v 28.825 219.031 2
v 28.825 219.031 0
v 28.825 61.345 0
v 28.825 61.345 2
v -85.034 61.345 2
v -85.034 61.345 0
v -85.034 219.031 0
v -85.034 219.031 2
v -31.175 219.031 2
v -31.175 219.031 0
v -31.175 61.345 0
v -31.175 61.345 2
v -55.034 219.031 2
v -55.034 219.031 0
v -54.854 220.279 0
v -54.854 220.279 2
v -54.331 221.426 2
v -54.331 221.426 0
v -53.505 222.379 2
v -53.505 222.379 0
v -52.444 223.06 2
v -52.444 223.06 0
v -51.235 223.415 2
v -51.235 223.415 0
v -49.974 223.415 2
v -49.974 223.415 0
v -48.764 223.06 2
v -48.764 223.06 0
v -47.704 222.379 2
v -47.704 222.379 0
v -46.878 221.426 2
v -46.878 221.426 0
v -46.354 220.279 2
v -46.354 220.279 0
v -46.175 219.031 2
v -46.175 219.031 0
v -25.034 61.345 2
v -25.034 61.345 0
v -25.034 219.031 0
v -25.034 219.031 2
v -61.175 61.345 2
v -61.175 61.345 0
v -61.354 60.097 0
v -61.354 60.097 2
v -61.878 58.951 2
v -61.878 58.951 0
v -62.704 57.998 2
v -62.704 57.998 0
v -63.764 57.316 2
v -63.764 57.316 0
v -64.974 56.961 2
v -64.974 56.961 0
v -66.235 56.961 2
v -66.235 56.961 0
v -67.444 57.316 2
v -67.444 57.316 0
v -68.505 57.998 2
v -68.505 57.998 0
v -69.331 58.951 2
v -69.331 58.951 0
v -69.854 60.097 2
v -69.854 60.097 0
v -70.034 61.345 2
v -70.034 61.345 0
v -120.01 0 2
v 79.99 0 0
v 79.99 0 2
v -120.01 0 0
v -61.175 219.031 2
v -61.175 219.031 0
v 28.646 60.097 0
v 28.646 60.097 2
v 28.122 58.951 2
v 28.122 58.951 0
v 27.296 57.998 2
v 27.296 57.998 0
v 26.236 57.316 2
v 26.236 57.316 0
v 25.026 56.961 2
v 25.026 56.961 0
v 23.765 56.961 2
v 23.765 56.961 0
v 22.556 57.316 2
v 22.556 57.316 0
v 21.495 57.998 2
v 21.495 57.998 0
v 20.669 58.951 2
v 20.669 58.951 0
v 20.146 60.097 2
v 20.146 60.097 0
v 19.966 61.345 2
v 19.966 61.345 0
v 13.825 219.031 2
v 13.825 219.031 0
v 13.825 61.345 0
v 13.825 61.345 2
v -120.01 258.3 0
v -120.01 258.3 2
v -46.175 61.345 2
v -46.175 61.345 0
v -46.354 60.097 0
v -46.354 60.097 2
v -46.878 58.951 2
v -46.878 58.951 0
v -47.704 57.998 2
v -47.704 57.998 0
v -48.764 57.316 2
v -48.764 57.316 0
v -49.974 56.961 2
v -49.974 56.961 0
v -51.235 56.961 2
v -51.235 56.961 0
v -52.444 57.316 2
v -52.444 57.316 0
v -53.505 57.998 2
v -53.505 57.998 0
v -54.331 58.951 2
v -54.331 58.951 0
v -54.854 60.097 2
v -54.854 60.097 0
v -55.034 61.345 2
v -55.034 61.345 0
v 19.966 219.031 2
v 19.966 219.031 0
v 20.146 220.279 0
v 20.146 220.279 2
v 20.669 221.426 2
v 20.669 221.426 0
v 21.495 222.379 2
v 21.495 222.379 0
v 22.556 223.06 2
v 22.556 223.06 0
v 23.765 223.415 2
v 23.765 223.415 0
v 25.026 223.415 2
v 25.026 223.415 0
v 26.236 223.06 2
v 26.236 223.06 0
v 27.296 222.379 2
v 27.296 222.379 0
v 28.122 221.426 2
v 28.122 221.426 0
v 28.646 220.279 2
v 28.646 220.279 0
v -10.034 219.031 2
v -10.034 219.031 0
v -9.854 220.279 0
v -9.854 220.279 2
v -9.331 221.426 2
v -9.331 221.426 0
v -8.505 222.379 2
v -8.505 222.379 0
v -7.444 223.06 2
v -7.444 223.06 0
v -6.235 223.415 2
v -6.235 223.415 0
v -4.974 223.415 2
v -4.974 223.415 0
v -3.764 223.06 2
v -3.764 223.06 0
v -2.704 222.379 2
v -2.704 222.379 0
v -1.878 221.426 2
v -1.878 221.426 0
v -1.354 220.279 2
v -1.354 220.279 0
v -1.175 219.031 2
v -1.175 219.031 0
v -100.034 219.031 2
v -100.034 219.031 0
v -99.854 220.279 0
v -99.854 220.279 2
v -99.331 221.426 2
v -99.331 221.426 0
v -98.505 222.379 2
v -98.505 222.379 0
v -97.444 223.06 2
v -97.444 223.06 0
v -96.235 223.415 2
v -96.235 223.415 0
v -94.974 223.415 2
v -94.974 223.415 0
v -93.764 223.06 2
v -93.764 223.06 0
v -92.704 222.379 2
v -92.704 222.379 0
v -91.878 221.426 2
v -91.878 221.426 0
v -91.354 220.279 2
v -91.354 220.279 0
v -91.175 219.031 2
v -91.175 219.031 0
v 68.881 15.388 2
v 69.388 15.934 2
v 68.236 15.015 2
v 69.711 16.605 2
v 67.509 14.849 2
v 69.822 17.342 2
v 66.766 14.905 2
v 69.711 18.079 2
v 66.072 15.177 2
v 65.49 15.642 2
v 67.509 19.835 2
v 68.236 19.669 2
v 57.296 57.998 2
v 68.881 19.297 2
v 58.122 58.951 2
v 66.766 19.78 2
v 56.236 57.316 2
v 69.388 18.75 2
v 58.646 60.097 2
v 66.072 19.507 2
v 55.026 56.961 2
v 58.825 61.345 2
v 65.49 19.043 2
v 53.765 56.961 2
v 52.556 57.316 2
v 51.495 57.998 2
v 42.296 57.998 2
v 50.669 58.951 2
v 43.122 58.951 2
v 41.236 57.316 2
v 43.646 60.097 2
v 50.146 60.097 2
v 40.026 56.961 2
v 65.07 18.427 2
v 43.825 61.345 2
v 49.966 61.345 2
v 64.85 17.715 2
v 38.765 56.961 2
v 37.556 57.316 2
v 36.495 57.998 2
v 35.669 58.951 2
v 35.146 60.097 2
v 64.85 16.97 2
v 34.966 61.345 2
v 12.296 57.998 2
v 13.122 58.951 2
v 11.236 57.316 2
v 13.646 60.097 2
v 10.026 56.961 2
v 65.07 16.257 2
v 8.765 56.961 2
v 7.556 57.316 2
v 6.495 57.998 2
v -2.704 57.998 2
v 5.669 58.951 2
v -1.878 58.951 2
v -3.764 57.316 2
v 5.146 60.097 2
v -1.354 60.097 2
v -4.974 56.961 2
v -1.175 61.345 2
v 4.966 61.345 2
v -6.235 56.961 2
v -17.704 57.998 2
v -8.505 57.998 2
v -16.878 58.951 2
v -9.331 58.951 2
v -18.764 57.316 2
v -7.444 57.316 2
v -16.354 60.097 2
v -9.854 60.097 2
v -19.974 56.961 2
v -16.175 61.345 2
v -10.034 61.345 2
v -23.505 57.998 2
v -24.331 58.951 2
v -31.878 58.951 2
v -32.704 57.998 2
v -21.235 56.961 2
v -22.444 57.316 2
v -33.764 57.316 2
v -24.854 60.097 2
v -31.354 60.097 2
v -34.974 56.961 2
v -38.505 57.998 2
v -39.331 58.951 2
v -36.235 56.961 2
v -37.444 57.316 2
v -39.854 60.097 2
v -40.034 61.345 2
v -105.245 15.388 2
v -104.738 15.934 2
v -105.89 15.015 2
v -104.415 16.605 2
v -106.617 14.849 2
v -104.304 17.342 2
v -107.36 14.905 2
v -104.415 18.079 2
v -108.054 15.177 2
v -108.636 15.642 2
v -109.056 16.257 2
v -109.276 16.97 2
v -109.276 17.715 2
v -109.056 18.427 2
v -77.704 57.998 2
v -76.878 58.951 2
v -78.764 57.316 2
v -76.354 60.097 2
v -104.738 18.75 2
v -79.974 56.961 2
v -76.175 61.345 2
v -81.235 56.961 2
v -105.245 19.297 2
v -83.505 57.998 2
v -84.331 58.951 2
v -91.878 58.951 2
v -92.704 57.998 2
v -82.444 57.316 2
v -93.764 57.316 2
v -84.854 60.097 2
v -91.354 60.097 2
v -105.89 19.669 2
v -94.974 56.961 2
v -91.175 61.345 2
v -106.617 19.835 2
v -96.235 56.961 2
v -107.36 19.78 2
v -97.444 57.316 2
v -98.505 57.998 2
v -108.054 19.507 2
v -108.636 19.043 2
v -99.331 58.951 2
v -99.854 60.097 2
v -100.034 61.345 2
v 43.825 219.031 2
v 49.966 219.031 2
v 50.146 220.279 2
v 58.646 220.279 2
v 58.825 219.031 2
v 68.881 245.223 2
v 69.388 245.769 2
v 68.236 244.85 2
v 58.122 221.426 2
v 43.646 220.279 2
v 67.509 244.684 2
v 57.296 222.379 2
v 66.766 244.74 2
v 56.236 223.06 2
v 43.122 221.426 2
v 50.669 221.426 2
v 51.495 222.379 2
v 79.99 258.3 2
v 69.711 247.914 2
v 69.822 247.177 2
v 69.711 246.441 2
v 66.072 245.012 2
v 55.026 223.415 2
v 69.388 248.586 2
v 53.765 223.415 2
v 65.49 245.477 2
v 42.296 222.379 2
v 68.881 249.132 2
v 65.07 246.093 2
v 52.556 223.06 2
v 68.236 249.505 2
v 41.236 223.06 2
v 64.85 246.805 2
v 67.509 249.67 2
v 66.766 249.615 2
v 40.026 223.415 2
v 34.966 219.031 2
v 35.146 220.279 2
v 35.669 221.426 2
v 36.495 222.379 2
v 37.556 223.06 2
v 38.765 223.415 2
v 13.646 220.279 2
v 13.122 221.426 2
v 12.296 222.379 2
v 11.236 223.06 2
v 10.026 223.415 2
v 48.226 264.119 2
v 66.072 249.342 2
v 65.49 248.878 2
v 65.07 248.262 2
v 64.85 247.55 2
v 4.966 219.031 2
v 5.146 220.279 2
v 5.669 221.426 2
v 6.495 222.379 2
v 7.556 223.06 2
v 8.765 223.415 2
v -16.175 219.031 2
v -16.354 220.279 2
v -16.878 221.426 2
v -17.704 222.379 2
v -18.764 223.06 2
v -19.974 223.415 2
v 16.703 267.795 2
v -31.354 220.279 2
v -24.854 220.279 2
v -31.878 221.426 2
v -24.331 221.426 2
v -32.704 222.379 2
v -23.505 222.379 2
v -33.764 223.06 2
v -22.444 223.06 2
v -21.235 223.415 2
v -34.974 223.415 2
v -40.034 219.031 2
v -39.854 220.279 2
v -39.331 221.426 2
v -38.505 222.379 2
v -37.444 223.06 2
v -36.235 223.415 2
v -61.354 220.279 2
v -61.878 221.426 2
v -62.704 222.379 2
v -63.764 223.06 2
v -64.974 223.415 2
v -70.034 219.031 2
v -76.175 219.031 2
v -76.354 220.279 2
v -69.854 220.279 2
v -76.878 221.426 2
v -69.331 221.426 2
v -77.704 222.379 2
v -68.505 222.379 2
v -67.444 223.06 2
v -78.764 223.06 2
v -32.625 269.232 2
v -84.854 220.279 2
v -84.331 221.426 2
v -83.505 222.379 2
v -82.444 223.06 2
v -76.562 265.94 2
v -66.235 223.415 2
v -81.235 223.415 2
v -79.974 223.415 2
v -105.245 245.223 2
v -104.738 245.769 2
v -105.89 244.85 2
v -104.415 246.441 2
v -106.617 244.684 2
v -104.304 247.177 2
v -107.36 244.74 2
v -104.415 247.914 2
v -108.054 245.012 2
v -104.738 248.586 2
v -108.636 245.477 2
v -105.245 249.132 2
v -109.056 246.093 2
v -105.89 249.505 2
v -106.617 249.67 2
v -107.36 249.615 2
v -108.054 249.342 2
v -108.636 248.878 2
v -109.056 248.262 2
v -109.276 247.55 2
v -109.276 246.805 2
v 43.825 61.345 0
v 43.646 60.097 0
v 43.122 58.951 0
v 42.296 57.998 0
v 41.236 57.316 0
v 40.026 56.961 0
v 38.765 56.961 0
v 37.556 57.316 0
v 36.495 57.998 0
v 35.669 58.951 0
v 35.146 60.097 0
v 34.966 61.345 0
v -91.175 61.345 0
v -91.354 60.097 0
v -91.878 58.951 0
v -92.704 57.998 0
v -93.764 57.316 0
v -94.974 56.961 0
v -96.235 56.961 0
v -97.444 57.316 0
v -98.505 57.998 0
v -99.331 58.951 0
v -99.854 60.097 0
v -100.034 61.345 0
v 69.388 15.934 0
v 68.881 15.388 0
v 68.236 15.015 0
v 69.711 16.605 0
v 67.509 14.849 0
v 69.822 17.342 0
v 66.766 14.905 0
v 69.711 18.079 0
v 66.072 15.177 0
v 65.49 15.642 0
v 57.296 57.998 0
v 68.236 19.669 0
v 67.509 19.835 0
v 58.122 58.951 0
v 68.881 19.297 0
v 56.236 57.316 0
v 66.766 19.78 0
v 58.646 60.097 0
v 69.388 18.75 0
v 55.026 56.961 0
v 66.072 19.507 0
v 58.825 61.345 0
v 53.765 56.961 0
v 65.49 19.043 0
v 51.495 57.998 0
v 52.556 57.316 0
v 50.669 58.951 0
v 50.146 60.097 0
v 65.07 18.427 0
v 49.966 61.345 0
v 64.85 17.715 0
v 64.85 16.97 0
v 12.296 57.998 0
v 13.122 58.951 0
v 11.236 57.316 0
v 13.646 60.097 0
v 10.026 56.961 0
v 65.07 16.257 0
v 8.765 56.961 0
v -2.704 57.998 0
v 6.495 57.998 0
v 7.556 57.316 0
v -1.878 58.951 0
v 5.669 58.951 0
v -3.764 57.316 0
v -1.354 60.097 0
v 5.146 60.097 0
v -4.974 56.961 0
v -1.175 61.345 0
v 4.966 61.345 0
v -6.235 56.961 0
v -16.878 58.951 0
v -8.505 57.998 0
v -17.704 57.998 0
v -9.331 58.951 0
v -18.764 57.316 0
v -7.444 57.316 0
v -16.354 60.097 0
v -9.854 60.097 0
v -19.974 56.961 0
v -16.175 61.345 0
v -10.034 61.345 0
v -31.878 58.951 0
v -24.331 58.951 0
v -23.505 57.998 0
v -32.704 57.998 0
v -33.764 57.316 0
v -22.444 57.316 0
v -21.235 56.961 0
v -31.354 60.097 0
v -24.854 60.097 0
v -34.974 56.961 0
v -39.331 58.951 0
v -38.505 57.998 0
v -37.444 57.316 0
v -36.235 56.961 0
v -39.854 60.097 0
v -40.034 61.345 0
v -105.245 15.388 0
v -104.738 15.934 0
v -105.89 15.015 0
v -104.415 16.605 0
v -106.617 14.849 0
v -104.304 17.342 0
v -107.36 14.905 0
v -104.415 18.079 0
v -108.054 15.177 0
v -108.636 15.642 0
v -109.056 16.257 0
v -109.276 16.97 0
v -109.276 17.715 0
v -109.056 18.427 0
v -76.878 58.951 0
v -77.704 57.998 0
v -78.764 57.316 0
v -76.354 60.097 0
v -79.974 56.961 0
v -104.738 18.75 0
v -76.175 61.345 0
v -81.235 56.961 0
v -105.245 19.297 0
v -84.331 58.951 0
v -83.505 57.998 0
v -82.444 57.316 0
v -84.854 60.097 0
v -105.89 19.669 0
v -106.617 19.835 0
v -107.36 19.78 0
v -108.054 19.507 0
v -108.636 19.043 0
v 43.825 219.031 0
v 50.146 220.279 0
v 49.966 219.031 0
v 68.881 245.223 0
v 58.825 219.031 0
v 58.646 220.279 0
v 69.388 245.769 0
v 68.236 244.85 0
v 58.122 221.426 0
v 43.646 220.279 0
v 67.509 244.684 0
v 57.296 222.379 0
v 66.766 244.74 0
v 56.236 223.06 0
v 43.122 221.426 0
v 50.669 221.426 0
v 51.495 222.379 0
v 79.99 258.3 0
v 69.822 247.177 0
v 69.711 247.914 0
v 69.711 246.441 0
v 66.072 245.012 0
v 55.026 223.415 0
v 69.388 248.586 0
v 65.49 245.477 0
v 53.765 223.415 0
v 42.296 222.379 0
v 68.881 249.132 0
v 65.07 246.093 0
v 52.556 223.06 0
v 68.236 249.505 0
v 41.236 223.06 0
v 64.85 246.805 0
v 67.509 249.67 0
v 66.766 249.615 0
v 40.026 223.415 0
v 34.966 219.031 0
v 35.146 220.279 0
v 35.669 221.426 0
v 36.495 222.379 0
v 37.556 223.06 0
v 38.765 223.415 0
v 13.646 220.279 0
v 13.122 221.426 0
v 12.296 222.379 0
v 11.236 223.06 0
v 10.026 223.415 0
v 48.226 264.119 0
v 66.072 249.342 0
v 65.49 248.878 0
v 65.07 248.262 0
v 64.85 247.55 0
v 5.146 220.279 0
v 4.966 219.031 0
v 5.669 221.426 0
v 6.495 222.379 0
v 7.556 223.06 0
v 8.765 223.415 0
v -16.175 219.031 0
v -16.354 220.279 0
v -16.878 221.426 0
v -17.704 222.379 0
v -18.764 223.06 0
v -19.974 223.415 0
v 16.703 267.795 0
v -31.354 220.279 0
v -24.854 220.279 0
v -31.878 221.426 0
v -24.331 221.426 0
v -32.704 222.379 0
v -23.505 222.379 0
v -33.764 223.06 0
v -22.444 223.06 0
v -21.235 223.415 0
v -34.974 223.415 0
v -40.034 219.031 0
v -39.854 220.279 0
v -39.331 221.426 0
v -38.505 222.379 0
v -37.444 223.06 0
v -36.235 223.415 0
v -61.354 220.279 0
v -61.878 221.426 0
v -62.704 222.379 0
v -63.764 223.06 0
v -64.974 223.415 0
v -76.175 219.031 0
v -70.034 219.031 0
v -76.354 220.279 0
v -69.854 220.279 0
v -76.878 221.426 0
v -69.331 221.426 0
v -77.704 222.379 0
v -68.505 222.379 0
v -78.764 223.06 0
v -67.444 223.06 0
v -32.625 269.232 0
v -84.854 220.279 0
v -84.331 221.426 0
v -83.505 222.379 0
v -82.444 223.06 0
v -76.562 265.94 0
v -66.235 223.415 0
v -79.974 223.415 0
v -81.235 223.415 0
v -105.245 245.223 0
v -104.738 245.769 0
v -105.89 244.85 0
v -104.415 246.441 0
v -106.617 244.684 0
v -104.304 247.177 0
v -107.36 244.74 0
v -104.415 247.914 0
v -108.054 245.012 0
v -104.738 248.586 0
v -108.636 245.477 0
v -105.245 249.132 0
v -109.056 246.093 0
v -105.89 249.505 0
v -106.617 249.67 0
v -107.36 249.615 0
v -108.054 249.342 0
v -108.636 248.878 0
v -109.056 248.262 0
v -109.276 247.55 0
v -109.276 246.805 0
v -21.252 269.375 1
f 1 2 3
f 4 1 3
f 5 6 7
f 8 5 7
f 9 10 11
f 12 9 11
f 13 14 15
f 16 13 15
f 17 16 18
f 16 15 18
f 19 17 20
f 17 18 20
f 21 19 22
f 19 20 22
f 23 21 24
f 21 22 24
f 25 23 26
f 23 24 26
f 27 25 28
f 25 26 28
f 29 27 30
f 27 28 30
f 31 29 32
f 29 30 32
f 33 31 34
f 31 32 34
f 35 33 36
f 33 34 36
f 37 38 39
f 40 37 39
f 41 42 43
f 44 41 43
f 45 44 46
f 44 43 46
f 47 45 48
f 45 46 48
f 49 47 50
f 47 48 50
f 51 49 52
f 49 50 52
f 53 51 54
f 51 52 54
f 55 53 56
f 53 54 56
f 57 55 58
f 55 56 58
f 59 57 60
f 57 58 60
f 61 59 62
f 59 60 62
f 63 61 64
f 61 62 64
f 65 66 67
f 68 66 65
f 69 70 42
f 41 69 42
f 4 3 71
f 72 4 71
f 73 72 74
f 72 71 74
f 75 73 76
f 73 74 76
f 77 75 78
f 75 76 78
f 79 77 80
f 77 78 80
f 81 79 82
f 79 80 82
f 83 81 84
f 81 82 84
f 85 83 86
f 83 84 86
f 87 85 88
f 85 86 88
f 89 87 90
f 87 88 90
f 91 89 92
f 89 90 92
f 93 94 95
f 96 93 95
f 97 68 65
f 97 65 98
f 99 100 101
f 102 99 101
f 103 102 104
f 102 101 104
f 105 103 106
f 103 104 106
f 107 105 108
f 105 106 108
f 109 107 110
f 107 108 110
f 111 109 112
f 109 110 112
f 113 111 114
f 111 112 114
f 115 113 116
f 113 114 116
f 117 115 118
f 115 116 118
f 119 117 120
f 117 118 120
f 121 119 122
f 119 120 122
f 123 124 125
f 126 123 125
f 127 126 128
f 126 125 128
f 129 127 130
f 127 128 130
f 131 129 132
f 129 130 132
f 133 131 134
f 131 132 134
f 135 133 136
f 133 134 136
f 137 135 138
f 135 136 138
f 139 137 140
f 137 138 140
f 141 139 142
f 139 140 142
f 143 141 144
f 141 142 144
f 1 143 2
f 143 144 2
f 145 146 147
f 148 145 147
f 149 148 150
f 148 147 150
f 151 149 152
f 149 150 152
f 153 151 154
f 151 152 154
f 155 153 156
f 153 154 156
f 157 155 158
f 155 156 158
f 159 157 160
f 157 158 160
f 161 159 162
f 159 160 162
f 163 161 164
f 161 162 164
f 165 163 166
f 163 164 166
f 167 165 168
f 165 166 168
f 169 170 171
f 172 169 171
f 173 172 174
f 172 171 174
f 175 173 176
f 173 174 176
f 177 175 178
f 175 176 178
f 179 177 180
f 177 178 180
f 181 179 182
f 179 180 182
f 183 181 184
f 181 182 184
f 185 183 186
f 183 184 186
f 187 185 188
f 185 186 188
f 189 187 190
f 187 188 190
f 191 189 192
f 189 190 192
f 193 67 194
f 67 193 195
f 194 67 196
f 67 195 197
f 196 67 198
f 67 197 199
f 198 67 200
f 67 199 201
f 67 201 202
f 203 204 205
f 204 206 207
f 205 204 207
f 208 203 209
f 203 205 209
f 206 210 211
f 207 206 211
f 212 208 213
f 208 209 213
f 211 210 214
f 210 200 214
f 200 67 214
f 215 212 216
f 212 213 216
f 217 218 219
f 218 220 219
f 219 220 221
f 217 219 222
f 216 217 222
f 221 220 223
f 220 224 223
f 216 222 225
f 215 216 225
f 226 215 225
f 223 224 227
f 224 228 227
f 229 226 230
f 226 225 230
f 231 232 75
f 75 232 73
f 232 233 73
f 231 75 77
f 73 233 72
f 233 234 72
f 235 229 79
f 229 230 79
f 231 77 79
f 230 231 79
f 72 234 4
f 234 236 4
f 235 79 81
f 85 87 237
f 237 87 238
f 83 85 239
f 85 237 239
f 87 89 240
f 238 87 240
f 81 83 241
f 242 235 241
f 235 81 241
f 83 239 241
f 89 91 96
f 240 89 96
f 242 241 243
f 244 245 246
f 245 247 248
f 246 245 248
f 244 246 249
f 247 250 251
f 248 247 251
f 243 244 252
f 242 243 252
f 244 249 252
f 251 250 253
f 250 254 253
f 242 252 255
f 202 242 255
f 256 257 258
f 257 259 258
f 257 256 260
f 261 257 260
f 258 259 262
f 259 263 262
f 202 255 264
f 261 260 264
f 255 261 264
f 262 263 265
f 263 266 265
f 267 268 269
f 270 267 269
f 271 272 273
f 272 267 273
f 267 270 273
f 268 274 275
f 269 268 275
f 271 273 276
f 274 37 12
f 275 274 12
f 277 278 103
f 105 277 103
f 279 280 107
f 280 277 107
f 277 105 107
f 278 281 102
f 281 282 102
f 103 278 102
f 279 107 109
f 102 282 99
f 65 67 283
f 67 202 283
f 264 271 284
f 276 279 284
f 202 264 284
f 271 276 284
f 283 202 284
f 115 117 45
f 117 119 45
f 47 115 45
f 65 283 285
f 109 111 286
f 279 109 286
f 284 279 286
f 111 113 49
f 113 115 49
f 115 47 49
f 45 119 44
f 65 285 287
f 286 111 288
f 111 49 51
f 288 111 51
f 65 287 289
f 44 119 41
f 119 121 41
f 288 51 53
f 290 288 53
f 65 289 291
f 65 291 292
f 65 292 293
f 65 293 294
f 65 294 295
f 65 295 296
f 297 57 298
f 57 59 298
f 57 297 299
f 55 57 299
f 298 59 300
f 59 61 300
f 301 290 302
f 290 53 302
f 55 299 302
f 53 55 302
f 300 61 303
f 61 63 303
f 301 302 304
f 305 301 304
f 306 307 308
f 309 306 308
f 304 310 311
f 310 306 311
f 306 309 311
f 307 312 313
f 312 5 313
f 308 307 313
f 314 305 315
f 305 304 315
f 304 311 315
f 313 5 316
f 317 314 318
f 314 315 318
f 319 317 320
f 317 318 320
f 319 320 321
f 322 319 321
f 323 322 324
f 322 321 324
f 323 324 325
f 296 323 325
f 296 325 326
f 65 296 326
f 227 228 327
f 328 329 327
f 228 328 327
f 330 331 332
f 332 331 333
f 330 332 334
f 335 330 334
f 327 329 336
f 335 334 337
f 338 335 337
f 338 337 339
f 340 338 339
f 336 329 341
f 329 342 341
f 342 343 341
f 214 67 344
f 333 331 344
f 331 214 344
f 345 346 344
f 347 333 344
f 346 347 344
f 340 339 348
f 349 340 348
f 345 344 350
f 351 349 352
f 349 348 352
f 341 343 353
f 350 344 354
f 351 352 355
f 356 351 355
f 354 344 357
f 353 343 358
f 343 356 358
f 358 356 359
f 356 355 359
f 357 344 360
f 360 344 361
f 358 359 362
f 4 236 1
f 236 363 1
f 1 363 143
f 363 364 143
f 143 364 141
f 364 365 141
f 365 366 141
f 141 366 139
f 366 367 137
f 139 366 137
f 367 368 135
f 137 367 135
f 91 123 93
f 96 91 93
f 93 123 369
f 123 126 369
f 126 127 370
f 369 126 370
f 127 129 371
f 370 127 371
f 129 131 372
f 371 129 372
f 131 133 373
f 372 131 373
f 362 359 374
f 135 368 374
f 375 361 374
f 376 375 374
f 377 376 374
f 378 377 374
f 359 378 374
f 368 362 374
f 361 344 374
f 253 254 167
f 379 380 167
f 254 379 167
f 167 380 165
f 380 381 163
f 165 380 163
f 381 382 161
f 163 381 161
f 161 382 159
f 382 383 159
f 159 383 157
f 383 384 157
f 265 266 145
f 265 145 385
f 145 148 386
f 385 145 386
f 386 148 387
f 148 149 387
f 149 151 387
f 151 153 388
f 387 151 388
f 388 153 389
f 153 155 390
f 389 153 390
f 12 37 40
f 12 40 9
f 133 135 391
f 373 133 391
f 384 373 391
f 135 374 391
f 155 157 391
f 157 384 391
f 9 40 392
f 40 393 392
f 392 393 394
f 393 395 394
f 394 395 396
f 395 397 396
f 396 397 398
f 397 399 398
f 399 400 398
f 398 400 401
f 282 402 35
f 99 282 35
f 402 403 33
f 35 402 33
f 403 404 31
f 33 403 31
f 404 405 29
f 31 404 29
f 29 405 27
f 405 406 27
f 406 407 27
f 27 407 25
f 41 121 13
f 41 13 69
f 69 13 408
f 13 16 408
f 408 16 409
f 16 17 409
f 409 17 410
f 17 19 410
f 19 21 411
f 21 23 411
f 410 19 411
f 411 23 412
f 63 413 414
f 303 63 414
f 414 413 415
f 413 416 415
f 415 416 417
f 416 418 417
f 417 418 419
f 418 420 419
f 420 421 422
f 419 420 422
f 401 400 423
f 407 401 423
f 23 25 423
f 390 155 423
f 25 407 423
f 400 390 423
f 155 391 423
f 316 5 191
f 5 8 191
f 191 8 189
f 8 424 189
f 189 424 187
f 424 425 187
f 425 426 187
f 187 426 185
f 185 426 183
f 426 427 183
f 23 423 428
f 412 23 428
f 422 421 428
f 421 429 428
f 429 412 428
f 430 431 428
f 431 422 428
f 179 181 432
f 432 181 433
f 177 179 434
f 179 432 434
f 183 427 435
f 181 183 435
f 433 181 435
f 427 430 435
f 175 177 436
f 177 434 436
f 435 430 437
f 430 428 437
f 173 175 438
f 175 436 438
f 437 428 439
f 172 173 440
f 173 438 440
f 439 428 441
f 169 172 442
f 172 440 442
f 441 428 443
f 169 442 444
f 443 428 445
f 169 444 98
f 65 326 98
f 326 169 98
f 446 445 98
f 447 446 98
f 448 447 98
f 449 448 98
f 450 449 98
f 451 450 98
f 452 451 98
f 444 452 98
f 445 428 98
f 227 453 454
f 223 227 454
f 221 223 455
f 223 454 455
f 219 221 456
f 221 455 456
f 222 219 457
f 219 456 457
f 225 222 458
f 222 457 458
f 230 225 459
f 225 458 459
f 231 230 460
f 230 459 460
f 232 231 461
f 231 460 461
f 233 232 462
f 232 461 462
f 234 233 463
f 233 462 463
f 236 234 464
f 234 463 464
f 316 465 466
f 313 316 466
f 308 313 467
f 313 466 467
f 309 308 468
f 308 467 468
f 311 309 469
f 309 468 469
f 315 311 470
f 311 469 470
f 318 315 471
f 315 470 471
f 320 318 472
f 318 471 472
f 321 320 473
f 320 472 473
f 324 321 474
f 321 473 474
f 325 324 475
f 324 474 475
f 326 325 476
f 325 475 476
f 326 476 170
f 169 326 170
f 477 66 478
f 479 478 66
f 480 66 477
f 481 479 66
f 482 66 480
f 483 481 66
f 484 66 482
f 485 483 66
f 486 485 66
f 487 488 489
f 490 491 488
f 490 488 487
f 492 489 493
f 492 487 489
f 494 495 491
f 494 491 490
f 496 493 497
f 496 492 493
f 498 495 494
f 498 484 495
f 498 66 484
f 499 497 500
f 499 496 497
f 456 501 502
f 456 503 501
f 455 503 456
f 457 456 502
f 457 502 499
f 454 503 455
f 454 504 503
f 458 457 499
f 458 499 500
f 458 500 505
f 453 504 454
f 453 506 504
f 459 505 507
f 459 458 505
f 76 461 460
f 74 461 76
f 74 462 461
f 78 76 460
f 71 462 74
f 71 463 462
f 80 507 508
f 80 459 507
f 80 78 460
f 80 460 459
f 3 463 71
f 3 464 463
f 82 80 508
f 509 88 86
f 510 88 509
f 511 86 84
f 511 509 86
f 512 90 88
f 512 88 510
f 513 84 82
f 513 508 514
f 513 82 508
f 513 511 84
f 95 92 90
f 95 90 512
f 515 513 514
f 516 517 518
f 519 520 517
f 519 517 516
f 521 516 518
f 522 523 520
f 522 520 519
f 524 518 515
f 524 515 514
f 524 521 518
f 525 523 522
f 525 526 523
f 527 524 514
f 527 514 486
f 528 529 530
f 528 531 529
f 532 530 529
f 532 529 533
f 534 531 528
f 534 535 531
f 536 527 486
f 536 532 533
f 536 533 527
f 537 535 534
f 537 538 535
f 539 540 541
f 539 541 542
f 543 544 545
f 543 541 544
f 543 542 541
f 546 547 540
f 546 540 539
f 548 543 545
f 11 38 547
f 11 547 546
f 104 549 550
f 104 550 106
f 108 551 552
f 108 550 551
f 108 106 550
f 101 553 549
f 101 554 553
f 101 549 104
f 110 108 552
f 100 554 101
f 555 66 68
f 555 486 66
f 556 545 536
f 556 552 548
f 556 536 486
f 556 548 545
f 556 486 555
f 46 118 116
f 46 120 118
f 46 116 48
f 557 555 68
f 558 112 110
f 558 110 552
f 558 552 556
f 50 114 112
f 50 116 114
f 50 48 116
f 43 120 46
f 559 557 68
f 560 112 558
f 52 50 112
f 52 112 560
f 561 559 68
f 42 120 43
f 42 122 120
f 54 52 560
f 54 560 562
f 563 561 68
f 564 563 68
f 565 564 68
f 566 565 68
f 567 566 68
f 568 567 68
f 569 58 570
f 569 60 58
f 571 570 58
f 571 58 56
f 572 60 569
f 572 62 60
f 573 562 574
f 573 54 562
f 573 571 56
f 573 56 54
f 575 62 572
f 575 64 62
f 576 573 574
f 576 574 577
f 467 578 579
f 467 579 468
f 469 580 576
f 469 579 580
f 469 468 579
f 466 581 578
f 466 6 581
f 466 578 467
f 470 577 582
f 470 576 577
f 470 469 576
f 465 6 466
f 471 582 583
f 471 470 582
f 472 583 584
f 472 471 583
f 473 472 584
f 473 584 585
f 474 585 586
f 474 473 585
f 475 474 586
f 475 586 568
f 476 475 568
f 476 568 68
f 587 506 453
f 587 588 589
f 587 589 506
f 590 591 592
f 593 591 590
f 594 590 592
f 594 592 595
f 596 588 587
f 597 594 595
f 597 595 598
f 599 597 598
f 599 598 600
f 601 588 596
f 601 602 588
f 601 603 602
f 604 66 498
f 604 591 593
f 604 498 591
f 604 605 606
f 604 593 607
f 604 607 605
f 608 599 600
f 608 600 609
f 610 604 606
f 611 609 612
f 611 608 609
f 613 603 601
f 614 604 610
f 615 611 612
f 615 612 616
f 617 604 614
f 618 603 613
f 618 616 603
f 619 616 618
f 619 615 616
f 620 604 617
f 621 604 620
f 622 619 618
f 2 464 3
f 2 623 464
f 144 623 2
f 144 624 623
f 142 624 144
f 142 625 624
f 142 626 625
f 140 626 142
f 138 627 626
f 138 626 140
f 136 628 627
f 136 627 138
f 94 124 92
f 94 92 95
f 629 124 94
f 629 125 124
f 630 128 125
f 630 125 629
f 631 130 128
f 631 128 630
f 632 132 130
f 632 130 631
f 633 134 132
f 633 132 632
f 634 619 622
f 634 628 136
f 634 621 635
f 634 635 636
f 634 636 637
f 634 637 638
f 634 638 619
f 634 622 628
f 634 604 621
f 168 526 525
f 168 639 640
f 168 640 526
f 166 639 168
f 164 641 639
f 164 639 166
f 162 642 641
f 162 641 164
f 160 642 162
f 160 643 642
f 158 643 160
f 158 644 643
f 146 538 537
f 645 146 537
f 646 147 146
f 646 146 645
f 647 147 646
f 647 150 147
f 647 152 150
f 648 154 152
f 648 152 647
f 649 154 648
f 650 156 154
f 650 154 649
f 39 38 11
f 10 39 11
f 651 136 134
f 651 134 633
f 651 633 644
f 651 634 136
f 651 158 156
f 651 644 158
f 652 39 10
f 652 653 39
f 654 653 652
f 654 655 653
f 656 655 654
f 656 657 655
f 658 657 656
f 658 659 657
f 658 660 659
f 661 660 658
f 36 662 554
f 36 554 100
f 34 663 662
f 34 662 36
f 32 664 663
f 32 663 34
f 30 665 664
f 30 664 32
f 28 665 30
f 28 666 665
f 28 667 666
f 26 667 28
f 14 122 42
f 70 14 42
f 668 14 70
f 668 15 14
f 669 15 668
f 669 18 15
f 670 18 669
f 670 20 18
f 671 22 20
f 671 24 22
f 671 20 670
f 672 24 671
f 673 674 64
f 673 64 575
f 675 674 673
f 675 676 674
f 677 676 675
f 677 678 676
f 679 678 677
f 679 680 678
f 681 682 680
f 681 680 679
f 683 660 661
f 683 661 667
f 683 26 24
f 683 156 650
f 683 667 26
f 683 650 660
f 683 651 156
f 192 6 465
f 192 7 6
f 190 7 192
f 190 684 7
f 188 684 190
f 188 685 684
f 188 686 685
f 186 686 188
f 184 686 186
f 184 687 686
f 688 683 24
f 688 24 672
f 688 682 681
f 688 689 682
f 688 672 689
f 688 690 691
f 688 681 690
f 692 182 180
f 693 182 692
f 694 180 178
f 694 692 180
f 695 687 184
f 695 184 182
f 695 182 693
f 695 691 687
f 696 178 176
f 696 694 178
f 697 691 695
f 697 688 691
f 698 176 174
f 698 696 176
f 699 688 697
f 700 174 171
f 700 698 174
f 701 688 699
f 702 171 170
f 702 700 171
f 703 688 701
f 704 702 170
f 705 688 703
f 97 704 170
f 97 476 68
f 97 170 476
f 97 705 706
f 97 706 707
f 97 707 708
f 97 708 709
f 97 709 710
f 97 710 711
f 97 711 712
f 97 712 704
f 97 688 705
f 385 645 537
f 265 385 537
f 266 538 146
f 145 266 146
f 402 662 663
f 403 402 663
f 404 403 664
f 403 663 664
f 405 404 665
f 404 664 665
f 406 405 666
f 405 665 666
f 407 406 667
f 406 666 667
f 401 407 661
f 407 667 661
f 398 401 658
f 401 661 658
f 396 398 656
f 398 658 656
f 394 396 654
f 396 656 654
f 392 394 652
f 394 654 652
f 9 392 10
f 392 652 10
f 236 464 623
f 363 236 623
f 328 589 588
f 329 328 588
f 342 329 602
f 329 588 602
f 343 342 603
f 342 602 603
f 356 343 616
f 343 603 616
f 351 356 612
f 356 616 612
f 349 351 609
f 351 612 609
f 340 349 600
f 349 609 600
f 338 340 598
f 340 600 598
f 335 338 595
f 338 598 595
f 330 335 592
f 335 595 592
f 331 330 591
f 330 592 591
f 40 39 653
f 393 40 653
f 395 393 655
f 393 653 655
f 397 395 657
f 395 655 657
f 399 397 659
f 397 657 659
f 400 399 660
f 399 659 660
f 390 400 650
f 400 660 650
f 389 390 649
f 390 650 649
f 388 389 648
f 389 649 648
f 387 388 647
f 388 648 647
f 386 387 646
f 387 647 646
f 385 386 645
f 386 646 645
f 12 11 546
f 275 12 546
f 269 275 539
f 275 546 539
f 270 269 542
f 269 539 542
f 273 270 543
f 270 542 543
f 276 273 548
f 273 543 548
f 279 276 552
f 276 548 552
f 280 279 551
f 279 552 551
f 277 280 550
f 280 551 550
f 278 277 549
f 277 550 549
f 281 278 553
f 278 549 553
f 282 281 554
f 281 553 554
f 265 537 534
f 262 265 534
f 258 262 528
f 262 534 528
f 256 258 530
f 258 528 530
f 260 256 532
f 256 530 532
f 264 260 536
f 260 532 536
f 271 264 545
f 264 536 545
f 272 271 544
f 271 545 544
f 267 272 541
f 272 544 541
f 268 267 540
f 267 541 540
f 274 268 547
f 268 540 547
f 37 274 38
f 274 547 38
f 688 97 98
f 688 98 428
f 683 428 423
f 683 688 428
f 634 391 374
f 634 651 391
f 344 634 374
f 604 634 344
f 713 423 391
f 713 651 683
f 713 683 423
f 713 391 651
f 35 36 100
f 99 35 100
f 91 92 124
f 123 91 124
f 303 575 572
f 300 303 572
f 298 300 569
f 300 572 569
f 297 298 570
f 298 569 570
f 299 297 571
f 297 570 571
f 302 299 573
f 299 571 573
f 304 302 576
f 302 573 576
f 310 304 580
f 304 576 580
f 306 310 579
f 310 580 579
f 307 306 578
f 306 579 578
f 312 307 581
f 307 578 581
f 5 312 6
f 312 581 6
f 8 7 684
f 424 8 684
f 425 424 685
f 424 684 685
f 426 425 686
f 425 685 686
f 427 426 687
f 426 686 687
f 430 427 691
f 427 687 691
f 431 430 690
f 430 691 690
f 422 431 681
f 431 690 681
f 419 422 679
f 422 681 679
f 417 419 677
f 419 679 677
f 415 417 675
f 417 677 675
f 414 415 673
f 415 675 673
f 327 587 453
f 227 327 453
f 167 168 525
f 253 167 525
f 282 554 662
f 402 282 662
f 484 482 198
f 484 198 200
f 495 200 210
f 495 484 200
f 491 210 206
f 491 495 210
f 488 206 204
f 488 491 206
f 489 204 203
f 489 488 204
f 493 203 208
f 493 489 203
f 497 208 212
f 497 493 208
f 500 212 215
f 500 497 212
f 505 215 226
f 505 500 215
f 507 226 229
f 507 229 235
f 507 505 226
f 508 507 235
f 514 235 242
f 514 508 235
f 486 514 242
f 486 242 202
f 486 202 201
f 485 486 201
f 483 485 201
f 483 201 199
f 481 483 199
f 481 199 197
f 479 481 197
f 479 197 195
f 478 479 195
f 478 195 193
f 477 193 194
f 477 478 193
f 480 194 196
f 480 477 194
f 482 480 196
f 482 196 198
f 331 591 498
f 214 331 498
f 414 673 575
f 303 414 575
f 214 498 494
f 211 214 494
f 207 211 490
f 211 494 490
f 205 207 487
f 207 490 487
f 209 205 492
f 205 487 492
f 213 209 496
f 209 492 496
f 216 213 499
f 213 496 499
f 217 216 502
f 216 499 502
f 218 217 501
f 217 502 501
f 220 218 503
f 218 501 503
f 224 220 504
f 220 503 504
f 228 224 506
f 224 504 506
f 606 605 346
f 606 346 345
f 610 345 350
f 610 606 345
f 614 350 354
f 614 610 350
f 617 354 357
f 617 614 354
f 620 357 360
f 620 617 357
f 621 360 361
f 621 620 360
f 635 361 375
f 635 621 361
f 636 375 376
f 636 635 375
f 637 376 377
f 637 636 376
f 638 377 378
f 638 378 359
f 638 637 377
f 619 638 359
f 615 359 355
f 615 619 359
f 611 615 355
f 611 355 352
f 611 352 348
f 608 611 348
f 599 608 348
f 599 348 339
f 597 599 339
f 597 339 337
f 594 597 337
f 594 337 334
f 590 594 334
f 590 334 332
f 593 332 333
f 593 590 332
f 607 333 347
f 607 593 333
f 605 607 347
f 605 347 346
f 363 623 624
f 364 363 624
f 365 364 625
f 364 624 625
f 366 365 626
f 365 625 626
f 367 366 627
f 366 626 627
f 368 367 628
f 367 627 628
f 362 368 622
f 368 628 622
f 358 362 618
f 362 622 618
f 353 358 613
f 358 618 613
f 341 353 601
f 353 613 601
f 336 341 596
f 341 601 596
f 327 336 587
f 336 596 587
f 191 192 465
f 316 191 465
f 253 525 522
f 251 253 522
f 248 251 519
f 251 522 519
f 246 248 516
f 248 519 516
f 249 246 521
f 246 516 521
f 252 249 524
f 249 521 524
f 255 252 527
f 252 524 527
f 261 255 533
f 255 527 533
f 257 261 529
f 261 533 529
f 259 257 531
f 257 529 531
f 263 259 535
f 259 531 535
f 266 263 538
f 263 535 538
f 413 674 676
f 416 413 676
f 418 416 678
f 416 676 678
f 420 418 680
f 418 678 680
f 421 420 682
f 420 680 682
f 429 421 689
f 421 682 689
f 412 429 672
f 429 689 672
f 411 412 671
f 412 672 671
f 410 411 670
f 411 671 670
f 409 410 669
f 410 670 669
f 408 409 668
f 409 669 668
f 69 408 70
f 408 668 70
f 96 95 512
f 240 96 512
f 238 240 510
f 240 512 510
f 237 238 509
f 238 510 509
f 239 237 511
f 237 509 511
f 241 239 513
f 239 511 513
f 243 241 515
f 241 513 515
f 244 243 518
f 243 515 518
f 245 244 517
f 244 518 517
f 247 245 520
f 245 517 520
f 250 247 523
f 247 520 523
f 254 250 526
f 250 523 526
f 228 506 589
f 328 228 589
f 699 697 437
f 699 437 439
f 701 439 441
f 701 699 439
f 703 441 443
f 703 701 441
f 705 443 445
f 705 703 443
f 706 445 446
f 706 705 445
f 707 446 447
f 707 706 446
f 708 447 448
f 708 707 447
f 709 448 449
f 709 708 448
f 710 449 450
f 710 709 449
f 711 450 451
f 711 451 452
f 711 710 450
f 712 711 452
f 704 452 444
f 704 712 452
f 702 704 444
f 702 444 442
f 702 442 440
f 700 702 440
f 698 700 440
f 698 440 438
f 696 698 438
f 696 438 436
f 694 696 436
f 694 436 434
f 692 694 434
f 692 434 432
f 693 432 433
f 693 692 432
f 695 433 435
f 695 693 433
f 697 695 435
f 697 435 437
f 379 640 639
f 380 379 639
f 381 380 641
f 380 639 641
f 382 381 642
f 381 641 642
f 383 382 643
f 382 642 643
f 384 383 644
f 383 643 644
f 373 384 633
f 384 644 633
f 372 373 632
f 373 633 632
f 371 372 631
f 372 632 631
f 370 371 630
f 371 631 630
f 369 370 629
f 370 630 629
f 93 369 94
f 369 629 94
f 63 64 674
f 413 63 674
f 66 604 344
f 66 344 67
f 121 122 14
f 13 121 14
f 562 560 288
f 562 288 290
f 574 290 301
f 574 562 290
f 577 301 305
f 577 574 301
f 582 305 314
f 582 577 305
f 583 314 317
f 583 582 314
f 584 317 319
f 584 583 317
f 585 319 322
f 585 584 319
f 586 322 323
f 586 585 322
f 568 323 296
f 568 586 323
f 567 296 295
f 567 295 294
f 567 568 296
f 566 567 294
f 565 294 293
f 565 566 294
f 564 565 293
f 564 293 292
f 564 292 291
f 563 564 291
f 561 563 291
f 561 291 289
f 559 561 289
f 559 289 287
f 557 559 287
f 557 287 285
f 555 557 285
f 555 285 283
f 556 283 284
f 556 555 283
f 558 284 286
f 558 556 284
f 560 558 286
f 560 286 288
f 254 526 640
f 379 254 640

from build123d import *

# Parameters (mm, degrees)
SKETCH1_R           = 2.5
BOSS_EXTRUDE1_DEPTH = 2


with BuildPart() as part:
    # Sketch1 → Boss-Extrude1 (new body)
    with BuildSketch(Plane.XY):
        with BuildLine():
            Line((79.989677419, 0), (-120.010322581, 0))
            Line((-120.010322581, 0), (-120.010322581, 258.3))
            add(Edge.make_bspline(
                [(-120.010322581, 258.3), (-22.49451042, 280.450990468), (79.989677419, 258.3)],
                knots=[0, 0, 0, 1, 1, 1], degree=2))
            Line((79.989677419, 258.3), (79.989677419, 0))
        make_face()
        with Locations((-106.803669914, 247.177426871)):
            Circle(SKETCH1_R, mode=Mode.SUBTRACT)
        with Locations((67.322454172, 247.177426871)):
            Circle(SKETCH1_R, mode=Mode.SUBTRACT)
        with Locations((67.322454172, 17.342199543)):
            Circle(SKETCH1_R, mode=Mode.SUBTRACT)
        with Locations((-106.803669914, 17.342199543)):
            Circle(SKETCH1_R, mode=Mode.SUBTRACT)
        with BuildLine():
            Line((-91.175010368, 219.031134186), (-91.175010368, 61.345209981))
            ThreePointArc((-91.175010368, 61.345209981), (-95.604390261, 56.915830088), (-100.033770154, 61.345209981))
            Line((-100.033770154, 61.345209981), (-100.033770154, 219.031134186))
            ThreePointArc((-100.033770154, 219.031134186), (-95.604390261, 223.460514079), (-91.175010368, 219.031134186))
        make_face(mode=Mode.SUBTRACT)
        with BuildLine():
            Line((-76.175010368, 219.031134186), (-76.175010368, 61.345209981))
            ThreePointArc((-76.175010368, 61.345209981), (-80.604390261, 56.915830088), (-85.033770154, 61.345209981))
            Line((-85.033770154, 61.345209981), (-85.033770154, 219.031134186))
            ThreePointArc((-85.033770154, 219.031134186), (-80.604390261, 223.460514079), (-76.175010368, 219.031134186))
        make_face(mode=Mode.SUBTRACT)
        with BuildLine():
            Line((-61.175010368, 219.031134186), (-61.175010368, 61.345209981))
            ThreePointArc((-61.175010368, 61.345209981), (-65.604390261, 56.915830088), (-70.033770154, 61.345209981))
            Line((-70.033770154, 61.345209981), (-70.033770154, 219.031134186))
            ThreePointArc((-70.033770154, 219.031134186), (-65.604390261, 223.460514079), (-61.175010368, 219.031134186))
        make_face(mode=Mode.SUBTRACT)
        with BuildLine():
            Line((-46.175010368, 219.031134186), (-46.175010368, 61.345209981))
            ThreePointArc((-46.175010368, 61.345209981), (-50.604390261, 56.915830088), (-55.033770154, 61.345209981))
            Line((-55.033770154, 61.345209981), (-55.033770154, 219.031134186))
            ThreePointArc((-55.033770154, 219.031134186), (-50.604390261, 223.460514079), (-46.175010368, 219.031134186))
        make_face(mode=Mode.SUBTRACT)
        with BuildLine():
            Line((-31.175010368, 219.031134186), (-31.175010368, 61.345209981))
            ThreePointArc((-31.175010368, 61.345209981), (-35.604390261, 56.915830088), (-40.033770154, 61.345209981))
            Line((-40.033770154, 61.345209981), (-40.033770154, 219.031134186))
            ThreePointArc((-40.033770154, 219.031134186), (-35.604390261, 223.460514079), (-31.175010368, 219.031134186))
        make_face(mode=Mode.SUBTRACT)
        with BuildLine():
            Line((-16.175010368, 219.031134186), (-16.175010368, 61.345209981))
            ThreePointArc((-16.175010368, 61.345209981), (-20.604390261, 56.915830088), (-25.033770154, 61.345209981))
            Line((-25.033770154, 61.345209981), (-25.033770154, 219.031134186))
            ThreePointArc((-25.033770154, 219.031134186), (-20.604390261, 223.460514079), (-16.175010368, 219.031134186))
        make_face(mode=Mode.SUBTRACT)
        with BuildLine():
            Line((-1.175010368, 219.031134186), (-1.175010368, 61.345209981))
            ThreePointArc((-1.175010368, 61.345209981), (-5.604390261, 56.915830088), (-10.033770154, 61.345209981))
            Line((-10.033770154, 61.345209981), (-10.033770154, 219.031134186))
            ThreePointArc((-10.033770154, 219.031134186), (-5.604390261, 223.460514079), (-1.175010368, 219.031134186))
        make_face(mode=Mode.SUBTRACT)
        with BuildLine():
            Line((13.824989632, 219.031134186), (13.824989632, 61.345209981))
            ThreePointArc((13.824989632, 61.345209981), (9.395609739, 56.915830088), (4.966229846, 61.345209981))
            Line((4.966229846, 61.345209981), (4.966229846, 219.031134186))
            ThreePointArc((4.966229846, 219.031134186), (9.395609739, 223.460514079), (13.824989632, 219.031134186))
        make_face(mode=Mode.SUBTRACT)
        with BuildLine():
            Line((28.824989632, 219.031134186), (28.824989632, 61.345209981))
            ThreePointArc((28.824989632, 61.345209981), (24.395609739, 56.915830088), (19.966229846, 61.345209981))
            Line((19.966229846, 61.345209981), (19.966229846, 219.031134186))
            ThreePointArc((19.966229846, 219.031134186), (24.395609739, 223.460514079), (28.824989632, 219.031134186))
        make_face(mode=Mode.SUBTRACT)
        with BuildLine():
            Line((43.824989632, 219.031134186), (43.824989632, 61.345209981))
            ThreePointArc((43.824989632, 61.345209981), (39.395609739, 56.915830088), (34.966229846, 61.345209981))
            Line((34.966229846, 61.345209981), (34.966229846, 219.031134186))
            ThreePointArc((34.966229846, 219.031134186), (39.395609739, 223.460514079), (43.824989632, 219.031134186))
        make_face(mode=Mode.SUBTRACT)
        with BuildLine():
            Line((58.824989632, 219.031134186), (58.824989632, 61.345209981))
            ThreePointArc((58.824989632, 61.345209981), (54.395609739, 56.915830088), (49.966229846, 61.345209981))
            Line((49.966229846, 61.345209981), (49.966229846, 219.031134186))
            ThreePointArc((49.966229846, 219.031134186), (54.395609739, 223.460514079), (58.824989632, 219.031134186))
        make_face(mode=Mode.SUBTRACT)
    extrude(amount=BOSS_EXTRUDE1_DEPTH)


solid = part.part
